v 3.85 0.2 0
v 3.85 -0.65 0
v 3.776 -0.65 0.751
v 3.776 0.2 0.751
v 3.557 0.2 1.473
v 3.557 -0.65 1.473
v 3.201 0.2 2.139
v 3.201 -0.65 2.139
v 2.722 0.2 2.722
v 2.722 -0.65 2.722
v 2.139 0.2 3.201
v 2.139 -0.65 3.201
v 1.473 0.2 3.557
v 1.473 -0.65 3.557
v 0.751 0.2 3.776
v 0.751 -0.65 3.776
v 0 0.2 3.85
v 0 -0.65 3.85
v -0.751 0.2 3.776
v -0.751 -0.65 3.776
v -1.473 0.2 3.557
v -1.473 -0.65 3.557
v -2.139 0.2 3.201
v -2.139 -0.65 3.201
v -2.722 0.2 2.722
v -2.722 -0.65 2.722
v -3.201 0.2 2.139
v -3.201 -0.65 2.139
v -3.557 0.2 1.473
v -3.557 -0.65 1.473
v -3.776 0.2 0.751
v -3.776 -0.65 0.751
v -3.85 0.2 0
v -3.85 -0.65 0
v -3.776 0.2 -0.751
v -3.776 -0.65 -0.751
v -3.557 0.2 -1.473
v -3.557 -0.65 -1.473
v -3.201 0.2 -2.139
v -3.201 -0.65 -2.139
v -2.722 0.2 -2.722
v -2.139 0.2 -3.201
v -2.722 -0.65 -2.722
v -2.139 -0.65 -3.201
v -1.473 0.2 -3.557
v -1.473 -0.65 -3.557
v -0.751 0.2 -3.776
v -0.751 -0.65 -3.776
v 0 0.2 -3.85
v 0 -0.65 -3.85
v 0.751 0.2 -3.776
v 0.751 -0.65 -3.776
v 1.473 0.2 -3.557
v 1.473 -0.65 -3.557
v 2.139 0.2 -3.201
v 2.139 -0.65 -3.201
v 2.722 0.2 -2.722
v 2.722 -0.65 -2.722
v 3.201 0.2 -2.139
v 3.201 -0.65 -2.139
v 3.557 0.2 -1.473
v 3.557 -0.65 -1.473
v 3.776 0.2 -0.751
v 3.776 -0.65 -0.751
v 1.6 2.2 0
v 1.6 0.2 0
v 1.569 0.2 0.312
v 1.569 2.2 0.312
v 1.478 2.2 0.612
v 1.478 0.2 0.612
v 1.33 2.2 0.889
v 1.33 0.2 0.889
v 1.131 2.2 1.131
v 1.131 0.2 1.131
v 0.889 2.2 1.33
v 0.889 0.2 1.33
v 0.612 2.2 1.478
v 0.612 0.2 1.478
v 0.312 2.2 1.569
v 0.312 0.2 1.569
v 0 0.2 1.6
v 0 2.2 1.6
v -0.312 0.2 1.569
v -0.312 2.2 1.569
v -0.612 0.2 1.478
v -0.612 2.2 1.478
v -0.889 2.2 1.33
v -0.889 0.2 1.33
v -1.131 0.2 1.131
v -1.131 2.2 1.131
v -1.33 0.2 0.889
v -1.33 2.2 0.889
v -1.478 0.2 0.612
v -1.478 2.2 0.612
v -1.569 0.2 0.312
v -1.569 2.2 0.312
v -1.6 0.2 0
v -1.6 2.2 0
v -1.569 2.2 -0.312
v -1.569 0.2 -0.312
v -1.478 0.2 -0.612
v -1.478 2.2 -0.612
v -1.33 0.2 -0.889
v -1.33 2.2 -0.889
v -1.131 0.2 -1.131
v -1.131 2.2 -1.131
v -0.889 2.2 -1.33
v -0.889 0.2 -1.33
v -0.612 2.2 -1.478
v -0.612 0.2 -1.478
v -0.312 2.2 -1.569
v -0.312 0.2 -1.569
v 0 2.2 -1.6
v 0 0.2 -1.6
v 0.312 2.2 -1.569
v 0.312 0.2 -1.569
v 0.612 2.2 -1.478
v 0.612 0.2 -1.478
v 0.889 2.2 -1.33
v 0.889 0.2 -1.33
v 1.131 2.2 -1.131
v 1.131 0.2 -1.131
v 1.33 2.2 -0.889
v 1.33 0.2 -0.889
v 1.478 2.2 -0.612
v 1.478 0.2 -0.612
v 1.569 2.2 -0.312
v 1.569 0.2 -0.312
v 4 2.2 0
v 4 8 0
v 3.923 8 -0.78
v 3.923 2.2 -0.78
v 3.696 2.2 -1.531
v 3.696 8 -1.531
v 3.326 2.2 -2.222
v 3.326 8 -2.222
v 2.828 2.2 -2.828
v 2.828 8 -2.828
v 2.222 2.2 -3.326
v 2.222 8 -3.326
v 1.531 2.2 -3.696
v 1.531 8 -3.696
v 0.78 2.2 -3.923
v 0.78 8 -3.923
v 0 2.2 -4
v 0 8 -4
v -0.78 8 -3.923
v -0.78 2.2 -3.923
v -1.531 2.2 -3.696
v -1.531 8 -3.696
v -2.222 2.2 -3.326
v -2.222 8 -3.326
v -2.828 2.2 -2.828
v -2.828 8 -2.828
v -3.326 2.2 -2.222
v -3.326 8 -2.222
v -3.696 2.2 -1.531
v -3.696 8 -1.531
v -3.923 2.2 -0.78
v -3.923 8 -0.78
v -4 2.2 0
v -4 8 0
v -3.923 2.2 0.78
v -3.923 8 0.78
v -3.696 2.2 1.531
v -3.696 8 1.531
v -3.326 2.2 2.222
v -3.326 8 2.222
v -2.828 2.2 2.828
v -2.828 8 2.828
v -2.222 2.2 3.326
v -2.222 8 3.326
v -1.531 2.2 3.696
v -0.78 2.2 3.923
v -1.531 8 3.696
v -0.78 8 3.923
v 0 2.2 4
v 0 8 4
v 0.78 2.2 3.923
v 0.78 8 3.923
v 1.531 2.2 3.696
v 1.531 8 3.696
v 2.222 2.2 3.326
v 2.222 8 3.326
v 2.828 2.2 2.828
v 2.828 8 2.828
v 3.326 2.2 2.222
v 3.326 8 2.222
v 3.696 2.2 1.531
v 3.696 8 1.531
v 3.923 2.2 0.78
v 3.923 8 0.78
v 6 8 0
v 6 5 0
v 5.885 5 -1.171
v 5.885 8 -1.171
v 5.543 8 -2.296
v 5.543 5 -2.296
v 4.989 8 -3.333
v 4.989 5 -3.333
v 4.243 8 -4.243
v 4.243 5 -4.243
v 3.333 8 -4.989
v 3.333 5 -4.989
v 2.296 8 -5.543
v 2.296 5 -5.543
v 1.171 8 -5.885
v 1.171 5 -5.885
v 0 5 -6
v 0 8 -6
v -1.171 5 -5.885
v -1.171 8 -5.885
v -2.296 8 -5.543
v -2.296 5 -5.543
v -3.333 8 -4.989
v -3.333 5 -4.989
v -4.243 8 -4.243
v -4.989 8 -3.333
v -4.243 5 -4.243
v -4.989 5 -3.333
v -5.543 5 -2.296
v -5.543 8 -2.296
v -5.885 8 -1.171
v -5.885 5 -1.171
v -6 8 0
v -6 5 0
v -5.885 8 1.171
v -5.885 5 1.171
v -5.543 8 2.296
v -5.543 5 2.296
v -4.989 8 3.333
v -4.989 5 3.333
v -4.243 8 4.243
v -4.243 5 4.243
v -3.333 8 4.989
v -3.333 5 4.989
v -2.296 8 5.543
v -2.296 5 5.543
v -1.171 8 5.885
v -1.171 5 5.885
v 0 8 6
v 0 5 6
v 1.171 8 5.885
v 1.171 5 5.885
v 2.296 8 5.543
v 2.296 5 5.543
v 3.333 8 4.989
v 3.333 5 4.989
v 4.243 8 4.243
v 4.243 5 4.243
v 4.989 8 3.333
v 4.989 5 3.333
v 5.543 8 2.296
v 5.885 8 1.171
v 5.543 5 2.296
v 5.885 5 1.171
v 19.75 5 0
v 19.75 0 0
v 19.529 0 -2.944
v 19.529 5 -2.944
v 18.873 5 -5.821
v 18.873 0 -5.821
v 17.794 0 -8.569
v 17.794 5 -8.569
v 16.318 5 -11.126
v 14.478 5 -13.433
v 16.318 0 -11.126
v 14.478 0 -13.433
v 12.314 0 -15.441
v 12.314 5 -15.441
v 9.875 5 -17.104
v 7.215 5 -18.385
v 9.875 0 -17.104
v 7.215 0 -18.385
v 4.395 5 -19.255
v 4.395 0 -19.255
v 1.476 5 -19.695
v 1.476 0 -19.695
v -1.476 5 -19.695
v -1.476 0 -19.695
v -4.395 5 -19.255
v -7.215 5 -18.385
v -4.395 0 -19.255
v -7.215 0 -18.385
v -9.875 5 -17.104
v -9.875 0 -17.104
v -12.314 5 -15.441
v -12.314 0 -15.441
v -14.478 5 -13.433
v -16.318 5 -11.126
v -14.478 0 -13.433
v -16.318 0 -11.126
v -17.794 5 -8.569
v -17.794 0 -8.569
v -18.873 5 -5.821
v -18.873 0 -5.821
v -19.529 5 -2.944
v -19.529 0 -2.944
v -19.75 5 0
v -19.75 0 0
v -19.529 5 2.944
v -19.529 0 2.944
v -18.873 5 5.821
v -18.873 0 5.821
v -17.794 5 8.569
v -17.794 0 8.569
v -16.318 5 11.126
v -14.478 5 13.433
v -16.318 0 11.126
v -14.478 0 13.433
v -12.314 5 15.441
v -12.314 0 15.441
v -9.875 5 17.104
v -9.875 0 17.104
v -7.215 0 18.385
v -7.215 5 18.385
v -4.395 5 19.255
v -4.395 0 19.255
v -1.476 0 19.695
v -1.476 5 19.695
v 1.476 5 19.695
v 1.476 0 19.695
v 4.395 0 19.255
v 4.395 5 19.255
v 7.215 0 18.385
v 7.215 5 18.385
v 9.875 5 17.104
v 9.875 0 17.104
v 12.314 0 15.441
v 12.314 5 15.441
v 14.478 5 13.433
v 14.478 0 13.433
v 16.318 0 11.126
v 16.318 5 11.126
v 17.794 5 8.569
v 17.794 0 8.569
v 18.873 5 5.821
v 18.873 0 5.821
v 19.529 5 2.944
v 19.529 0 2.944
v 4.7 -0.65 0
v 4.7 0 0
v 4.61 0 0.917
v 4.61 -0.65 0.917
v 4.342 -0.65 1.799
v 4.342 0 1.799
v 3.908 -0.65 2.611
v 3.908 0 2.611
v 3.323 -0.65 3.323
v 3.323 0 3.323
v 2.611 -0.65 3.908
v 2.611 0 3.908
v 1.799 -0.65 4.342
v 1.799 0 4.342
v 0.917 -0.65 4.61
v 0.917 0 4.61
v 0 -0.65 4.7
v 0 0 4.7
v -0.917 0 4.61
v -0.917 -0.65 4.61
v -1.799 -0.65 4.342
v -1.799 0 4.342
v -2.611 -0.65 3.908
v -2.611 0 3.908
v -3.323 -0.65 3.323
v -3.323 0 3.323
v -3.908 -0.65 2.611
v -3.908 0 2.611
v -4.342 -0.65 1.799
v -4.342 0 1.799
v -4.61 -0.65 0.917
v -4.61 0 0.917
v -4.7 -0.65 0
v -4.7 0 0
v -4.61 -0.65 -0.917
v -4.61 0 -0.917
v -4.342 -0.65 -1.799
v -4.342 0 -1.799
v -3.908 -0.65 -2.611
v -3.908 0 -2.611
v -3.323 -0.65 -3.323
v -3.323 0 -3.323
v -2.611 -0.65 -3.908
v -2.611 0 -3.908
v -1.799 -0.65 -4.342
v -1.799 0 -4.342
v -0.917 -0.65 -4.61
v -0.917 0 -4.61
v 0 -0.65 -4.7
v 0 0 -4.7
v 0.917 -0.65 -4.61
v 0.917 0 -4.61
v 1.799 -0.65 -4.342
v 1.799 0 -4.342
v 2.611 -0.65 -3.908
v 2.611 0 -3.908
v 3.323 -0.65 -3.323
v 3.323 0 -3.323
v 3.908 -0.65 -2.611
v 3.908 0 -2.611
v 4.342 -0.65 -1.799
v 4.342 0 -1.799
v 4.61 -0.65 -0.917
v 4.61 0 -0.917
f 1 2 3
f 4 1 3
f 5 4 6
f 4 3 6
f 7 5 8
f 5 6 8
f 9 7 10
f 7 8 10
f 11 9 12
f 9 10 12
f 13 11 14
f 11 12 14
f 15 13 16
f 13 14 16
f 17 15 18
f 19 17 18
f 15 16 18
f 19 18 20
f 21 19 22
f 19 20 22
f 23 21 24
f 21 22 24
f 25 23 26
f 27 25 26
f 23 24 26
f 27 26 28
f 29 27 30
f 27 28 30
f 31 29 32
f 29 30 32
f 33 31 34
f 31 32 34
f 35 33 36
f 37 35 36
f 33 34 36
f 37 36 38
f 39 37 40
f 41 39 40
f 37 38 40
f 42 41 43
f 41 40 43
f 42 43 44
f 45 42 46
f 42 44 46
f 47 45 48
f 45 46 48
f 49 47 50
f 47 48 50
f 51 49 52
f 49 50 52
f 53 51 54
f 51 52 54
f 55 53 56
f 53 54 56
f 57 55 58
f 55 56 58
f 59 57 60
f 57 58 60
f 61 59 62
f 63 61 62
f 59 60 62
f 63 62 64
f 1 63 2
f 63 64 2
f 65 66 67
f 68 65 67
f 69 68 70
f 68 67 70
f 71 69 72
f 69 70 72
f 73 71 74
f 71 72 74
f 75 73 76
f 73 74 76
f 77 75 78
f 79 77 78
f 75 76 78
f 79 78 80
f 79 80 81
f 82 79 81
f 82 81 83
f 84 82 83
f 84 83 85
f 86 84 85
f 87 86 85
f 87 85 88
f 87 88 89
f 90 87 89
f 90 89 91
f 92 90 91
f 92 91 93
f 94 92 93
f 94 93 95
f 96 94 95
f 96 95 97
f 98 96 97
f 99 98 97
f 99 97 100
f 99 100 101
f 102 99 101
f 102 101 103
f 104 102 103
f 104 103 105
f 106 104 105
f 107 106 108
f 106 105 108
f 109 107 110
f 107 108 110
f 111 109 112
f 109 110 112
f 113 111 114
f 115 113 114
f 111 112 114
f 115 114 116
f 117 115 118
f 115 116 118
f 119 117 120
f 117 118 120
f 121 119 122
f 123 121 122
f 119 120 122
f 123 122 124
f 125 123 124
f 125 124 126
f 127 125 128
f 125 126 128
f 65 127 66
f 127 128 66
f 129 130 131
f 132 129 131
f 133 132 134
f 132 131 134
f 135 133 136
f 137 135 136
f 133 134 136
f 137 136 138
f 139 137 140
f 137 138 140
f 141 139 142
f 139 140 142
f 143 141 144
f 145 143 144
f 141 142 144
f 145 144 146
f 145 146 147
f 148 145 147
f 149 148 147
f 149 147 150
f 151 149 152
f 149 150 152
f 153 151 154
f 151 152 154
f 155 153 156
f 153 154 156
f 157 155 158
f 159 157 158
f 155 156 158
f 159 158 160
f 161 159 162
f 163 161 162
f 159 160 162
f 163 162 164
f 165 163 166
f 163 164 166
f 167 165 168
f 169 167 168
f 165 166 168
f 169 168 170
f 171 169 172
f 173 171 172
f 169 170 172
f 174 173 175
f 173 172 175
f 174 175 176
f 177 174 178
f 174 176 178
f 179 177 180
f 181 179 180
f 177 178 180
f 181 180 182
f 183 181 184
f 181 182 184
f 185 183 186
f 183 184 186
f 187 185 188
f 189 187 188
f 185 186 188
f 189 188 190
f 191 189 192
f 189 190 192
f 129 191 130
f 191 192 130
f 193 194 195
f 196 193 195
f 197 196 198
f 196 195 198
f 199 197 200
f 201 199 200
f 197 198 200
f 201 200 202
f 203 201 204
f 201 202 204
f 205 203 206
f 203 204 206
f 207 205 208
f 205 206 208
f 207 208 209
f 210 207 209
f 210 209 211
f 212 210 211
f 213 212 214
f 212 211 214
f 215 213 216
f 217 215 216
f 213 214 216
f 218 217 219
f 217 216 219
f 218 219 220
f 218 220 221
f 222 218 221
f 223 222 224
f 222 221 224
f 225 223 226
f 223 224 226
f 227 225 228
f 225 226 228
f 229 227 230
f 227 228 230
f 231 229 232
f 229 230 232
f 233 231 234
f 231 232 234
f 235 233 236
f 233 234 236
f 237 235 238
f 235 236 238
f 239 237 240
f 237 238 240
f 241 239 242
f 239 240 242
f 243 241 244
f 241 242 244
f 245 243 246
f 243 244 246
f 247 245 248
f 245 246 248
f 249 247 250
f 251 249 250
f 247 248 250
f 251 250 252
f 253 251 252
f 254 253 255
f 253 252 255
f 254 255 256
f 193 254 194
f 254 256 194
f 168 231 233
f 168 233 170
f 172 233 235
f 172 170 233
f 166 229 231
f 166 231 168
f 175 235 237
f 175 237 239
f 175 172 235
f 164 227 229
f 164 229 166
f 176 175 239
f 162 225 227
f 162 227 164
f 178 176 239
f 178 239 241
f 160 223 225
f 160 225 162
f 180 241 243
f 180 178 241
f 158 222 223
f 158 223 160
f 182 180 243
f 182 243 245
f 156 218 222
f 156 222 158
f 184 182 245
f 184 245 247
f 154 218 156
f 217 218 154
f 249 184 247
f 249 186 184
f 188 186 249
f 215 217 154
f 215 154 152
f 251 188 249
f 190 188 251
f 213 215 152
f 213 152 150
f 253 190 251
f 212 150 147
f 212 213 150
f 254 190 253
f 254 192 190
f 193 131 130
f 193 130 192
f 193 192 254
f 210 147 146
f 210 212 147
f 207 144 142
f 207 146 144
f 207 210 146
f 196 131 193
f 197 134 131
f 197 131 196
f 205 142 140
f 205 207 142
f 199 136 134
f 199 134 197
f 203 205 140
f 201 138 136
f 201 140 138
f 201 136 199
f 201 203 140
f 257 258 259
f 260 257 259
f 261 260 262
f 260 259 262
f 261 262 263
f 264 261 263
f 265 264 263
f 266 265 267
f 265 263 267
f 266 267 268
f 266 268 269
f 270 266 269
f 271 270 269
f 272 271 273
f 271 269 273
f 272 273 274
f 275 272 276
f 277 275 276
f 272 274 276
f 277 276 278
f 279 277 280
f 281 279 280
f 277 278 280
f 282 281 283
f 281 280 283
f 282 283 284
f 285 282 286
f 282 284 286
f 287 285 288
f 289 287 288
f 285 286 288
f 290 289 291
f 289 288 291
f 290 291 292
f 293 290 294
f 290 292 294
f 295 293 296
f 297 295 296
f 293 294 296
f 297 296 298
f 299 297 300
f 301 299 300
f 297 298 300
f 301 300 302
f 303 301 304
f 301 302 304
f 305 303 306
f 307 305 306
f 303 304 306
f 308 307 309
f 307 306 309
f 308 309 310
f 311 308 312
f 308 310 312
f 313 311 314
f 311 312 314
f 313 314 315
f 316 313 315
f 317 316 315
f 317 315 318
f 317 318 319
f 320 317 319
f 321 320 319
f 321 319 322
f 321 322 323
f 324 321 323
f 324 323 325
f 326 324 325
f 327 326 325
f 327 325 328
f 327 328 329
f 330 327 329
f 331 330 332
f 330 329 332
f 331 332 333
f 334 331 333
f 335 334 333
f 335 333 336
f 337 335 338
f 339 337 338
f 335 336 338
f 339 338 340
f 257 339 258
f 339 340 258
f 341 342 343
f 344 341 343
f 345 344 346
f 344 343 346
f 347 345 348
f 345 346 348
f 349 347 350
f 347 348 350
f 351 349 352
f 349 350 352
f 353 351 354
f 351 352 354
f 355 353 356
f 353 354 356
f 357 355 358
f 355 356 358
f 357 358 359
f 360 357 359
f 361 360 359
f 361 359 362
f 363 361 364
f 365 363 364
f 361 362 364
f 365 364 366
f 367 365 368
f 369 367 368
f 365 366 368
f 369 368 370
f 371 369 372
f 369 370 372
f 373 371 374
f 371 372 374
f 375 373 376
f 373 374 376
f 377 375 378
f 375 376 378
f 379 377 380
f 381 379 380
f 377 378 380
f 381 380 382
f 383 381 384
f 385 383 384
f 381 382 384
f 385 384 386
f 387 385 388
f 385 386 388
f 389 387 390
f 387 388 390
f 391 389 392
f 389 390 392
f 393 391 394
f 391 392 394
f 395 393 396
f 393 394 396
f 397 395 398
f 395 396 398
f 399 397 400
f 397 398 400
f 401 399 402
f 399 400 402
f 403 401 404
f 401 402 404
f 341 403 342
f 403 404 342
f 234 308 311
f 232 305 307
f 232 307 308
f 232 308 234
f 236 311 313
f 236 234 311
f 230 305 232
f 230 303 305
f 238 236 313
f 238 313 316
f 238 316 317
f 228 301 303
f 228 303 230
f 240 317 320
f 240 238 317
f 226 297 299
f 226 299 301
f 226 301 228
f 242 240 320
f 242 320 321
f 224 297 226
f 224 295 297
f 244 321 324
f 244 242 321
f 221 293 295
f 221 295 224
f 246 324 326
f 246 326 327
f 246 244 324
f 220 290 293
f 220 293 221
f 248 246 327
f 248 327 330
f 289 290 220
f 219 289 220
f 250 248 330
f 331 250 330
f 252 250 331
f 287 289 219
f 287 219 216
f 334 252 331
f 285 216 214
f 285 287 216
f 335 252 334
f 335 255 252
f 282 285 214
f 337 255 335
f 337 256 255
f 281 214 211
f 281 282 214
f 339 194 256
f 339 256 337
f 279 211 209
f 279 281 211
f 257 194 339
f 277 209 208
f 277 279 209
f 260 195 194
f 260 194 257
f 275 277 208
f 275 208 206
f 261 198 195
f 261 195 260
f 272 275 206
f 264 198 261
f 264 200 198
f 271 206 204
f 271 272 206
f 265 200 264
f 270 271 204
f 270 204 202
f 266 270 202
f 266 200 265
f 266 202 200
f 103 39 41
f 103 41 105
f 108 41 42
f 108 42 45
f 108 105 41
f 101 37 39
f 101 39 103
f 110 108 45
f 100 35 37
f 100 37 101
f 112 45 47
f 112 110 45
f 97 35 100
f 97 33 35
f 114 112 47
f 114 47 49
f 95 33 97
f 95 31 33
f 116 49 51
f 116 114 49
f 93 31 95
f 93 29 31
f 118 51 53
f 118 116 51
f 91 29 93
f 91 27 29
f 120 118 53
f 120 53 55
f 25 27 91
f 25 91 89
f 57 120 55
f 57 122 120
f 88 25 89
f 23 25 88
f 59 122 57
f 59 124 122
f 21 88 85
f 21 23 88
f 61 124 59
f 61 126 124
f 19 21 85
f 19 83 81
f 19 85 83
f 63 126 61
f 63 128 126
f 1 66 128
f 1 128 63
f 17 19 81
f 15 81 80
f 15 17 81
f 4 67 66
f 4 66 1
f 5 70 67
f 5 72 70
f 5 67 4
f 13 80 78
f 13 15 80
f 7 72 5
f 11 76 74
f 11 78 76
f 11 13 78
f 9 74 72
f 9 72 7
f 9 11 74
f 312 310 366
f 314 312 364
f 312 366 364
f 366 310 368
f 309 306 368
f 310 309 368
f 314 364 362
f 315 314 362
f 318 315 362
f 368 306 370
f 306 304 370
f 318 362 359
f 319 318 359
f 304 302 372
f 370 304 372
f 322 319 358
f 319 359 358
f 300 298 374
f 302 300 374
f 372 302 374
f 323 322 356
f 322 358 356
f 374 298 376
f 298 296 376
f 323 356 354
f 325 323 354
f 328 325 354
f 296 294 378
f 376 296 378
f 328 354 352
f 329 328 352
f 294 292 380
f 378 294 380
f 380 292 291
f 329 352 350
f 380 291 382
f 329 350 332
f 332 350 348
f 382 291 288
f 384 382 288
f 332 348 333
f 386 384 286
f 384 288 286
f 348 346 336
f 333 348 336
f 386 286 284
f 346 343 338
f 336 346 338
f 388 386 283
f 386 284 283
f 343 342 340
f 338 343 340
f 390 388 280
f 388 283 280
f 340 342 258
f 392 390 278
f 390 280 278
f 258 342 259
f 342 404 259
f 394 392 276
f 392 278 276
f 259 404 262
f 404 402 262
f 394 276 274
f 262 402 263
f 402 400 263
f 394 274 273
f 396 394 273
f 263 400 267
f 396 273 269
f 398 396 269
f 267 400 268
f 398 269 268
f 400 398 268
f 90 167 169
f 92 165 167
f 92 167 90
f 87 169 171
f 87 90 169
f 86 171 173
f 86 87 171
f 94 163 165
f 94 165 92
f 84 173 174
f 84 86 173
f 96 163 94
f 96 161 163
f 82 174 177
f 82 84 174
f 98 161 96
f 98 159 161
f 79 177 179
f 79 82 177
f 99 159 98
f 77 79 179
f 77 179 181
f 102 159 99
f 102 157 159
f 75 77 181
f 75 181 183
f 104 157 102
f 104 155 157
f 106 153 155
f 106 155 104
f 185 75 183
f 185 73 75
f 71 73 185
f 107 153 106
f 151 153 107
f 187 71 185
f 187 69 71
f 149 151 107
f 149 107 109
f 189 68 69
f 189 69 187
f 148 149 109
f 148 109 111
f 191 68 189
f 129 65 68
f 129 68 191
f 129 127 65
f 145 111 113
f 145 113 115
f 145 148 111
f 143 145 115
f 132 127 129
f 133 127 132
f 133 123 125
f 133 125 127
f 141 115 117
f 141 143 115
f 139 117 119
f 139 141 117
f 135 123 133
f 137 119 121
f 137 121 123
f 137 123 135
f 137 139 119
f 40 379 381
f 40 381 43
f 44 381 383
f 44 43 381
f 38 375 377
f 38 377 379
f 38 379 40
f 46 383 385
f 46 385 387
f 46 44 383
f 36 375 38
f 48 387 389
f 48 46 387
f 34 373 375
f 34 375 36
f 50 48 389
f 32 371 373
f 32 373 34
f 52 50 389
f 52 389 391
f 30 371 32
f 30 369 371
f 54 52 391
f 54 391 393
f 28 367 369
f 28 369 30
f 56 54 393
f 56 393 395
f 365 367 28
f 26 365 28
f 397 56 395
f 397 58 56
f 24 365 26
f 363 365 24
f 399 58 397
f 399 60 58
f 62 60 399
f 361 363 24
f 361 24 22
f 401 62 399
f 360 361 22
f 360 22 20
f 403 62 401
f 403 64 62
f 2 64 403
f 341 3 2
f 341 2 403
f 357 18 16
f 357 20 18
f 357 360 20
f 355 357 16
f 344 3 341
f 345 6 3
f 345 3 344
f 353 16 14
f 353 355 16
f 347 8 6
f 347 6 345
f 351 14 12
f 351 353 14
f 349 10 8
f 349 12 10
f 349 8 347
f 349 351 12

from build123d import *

# Parameters (mm, degrees)
SKETCH_1_R          = 19.75
EXTRUDE_1_DEPTH     = 5
SKETCH_2_R          = 6
EXTRUDE_2_DEPTH     = 3
SKETCH_3_R          = 4.7
EXTRUDE_3_DEPTH     = 0.65
SKETCH_4_R          = 1.6
CUT_EXTRUDE_1_DEPTH = 9.65
SKETCH_5_R          = 3.85
CUT_EXTRUDE_2_DEPTH = 0.85
SKETCH_6_R          = 4
CUT_EXTRUDE_3_DEPTH = 5.8


with BuildPart() as part:
    # 草圖1 → 填料-伸長1 (new body)
    with BuildSketch(Plane(origin=(0, 0, 0), x_dir=(1, 0, 0), z_dir=(0, 1, 0))):
        Circle(SKETCH_1_R)
    extrude(amount=EXTRUDE_1_DEPTH)

    # 草圖2 → 填料-伸長2 (add)
    with BuildSketch(Plane(origin=(0, 5, 0), x_dir=(1, 0, 0), z_dir=(0, 1, 0))):
        Circle(SKETCH_2_R)
    extrude(amount=EXTRUDE_2_DEPTH)

    # 草圖3 → 填料-伸長3 (add)
    with BuildSketch(Plane.XZ):
        Circle(SKETCH_3_R)
    extrude(amount=EXTRUDE_3_DEPTH)

    # 草圖4 → 除料-伸長1 (cut, through all)
    with BuildSketch(Plane.XZ.offset(0.65)):
        Circle(SKETCH_4_R)
    extrude(amount=-CUT_EXTRUDE_1_DEPTH, mode=Mode.SUBTRACT)

    # 草圖5 → 除料-伸長2 (cut)
    with BuildSketch(Plane.XZ.offset(0.65)):
        Circle(SKETCH_5_R)
    extrude(amount=-CUT_EXTRUDE_2_DEPTH, mode=Mode.SUBTRACT)

    # 草圖6 → 除料-伸長3 (cut)
    with BuildSketch(Plane(origin=(0, 8, 0), x_dir=(1, 0, 0), z_dir=(0, 1, 0))):
        Circle(SKETCH_6_R)
    extrude(amount=-CUT_EXTRUDE_3_DEPTH, mode=Mode.SUBTRACT)


solid = part.part
